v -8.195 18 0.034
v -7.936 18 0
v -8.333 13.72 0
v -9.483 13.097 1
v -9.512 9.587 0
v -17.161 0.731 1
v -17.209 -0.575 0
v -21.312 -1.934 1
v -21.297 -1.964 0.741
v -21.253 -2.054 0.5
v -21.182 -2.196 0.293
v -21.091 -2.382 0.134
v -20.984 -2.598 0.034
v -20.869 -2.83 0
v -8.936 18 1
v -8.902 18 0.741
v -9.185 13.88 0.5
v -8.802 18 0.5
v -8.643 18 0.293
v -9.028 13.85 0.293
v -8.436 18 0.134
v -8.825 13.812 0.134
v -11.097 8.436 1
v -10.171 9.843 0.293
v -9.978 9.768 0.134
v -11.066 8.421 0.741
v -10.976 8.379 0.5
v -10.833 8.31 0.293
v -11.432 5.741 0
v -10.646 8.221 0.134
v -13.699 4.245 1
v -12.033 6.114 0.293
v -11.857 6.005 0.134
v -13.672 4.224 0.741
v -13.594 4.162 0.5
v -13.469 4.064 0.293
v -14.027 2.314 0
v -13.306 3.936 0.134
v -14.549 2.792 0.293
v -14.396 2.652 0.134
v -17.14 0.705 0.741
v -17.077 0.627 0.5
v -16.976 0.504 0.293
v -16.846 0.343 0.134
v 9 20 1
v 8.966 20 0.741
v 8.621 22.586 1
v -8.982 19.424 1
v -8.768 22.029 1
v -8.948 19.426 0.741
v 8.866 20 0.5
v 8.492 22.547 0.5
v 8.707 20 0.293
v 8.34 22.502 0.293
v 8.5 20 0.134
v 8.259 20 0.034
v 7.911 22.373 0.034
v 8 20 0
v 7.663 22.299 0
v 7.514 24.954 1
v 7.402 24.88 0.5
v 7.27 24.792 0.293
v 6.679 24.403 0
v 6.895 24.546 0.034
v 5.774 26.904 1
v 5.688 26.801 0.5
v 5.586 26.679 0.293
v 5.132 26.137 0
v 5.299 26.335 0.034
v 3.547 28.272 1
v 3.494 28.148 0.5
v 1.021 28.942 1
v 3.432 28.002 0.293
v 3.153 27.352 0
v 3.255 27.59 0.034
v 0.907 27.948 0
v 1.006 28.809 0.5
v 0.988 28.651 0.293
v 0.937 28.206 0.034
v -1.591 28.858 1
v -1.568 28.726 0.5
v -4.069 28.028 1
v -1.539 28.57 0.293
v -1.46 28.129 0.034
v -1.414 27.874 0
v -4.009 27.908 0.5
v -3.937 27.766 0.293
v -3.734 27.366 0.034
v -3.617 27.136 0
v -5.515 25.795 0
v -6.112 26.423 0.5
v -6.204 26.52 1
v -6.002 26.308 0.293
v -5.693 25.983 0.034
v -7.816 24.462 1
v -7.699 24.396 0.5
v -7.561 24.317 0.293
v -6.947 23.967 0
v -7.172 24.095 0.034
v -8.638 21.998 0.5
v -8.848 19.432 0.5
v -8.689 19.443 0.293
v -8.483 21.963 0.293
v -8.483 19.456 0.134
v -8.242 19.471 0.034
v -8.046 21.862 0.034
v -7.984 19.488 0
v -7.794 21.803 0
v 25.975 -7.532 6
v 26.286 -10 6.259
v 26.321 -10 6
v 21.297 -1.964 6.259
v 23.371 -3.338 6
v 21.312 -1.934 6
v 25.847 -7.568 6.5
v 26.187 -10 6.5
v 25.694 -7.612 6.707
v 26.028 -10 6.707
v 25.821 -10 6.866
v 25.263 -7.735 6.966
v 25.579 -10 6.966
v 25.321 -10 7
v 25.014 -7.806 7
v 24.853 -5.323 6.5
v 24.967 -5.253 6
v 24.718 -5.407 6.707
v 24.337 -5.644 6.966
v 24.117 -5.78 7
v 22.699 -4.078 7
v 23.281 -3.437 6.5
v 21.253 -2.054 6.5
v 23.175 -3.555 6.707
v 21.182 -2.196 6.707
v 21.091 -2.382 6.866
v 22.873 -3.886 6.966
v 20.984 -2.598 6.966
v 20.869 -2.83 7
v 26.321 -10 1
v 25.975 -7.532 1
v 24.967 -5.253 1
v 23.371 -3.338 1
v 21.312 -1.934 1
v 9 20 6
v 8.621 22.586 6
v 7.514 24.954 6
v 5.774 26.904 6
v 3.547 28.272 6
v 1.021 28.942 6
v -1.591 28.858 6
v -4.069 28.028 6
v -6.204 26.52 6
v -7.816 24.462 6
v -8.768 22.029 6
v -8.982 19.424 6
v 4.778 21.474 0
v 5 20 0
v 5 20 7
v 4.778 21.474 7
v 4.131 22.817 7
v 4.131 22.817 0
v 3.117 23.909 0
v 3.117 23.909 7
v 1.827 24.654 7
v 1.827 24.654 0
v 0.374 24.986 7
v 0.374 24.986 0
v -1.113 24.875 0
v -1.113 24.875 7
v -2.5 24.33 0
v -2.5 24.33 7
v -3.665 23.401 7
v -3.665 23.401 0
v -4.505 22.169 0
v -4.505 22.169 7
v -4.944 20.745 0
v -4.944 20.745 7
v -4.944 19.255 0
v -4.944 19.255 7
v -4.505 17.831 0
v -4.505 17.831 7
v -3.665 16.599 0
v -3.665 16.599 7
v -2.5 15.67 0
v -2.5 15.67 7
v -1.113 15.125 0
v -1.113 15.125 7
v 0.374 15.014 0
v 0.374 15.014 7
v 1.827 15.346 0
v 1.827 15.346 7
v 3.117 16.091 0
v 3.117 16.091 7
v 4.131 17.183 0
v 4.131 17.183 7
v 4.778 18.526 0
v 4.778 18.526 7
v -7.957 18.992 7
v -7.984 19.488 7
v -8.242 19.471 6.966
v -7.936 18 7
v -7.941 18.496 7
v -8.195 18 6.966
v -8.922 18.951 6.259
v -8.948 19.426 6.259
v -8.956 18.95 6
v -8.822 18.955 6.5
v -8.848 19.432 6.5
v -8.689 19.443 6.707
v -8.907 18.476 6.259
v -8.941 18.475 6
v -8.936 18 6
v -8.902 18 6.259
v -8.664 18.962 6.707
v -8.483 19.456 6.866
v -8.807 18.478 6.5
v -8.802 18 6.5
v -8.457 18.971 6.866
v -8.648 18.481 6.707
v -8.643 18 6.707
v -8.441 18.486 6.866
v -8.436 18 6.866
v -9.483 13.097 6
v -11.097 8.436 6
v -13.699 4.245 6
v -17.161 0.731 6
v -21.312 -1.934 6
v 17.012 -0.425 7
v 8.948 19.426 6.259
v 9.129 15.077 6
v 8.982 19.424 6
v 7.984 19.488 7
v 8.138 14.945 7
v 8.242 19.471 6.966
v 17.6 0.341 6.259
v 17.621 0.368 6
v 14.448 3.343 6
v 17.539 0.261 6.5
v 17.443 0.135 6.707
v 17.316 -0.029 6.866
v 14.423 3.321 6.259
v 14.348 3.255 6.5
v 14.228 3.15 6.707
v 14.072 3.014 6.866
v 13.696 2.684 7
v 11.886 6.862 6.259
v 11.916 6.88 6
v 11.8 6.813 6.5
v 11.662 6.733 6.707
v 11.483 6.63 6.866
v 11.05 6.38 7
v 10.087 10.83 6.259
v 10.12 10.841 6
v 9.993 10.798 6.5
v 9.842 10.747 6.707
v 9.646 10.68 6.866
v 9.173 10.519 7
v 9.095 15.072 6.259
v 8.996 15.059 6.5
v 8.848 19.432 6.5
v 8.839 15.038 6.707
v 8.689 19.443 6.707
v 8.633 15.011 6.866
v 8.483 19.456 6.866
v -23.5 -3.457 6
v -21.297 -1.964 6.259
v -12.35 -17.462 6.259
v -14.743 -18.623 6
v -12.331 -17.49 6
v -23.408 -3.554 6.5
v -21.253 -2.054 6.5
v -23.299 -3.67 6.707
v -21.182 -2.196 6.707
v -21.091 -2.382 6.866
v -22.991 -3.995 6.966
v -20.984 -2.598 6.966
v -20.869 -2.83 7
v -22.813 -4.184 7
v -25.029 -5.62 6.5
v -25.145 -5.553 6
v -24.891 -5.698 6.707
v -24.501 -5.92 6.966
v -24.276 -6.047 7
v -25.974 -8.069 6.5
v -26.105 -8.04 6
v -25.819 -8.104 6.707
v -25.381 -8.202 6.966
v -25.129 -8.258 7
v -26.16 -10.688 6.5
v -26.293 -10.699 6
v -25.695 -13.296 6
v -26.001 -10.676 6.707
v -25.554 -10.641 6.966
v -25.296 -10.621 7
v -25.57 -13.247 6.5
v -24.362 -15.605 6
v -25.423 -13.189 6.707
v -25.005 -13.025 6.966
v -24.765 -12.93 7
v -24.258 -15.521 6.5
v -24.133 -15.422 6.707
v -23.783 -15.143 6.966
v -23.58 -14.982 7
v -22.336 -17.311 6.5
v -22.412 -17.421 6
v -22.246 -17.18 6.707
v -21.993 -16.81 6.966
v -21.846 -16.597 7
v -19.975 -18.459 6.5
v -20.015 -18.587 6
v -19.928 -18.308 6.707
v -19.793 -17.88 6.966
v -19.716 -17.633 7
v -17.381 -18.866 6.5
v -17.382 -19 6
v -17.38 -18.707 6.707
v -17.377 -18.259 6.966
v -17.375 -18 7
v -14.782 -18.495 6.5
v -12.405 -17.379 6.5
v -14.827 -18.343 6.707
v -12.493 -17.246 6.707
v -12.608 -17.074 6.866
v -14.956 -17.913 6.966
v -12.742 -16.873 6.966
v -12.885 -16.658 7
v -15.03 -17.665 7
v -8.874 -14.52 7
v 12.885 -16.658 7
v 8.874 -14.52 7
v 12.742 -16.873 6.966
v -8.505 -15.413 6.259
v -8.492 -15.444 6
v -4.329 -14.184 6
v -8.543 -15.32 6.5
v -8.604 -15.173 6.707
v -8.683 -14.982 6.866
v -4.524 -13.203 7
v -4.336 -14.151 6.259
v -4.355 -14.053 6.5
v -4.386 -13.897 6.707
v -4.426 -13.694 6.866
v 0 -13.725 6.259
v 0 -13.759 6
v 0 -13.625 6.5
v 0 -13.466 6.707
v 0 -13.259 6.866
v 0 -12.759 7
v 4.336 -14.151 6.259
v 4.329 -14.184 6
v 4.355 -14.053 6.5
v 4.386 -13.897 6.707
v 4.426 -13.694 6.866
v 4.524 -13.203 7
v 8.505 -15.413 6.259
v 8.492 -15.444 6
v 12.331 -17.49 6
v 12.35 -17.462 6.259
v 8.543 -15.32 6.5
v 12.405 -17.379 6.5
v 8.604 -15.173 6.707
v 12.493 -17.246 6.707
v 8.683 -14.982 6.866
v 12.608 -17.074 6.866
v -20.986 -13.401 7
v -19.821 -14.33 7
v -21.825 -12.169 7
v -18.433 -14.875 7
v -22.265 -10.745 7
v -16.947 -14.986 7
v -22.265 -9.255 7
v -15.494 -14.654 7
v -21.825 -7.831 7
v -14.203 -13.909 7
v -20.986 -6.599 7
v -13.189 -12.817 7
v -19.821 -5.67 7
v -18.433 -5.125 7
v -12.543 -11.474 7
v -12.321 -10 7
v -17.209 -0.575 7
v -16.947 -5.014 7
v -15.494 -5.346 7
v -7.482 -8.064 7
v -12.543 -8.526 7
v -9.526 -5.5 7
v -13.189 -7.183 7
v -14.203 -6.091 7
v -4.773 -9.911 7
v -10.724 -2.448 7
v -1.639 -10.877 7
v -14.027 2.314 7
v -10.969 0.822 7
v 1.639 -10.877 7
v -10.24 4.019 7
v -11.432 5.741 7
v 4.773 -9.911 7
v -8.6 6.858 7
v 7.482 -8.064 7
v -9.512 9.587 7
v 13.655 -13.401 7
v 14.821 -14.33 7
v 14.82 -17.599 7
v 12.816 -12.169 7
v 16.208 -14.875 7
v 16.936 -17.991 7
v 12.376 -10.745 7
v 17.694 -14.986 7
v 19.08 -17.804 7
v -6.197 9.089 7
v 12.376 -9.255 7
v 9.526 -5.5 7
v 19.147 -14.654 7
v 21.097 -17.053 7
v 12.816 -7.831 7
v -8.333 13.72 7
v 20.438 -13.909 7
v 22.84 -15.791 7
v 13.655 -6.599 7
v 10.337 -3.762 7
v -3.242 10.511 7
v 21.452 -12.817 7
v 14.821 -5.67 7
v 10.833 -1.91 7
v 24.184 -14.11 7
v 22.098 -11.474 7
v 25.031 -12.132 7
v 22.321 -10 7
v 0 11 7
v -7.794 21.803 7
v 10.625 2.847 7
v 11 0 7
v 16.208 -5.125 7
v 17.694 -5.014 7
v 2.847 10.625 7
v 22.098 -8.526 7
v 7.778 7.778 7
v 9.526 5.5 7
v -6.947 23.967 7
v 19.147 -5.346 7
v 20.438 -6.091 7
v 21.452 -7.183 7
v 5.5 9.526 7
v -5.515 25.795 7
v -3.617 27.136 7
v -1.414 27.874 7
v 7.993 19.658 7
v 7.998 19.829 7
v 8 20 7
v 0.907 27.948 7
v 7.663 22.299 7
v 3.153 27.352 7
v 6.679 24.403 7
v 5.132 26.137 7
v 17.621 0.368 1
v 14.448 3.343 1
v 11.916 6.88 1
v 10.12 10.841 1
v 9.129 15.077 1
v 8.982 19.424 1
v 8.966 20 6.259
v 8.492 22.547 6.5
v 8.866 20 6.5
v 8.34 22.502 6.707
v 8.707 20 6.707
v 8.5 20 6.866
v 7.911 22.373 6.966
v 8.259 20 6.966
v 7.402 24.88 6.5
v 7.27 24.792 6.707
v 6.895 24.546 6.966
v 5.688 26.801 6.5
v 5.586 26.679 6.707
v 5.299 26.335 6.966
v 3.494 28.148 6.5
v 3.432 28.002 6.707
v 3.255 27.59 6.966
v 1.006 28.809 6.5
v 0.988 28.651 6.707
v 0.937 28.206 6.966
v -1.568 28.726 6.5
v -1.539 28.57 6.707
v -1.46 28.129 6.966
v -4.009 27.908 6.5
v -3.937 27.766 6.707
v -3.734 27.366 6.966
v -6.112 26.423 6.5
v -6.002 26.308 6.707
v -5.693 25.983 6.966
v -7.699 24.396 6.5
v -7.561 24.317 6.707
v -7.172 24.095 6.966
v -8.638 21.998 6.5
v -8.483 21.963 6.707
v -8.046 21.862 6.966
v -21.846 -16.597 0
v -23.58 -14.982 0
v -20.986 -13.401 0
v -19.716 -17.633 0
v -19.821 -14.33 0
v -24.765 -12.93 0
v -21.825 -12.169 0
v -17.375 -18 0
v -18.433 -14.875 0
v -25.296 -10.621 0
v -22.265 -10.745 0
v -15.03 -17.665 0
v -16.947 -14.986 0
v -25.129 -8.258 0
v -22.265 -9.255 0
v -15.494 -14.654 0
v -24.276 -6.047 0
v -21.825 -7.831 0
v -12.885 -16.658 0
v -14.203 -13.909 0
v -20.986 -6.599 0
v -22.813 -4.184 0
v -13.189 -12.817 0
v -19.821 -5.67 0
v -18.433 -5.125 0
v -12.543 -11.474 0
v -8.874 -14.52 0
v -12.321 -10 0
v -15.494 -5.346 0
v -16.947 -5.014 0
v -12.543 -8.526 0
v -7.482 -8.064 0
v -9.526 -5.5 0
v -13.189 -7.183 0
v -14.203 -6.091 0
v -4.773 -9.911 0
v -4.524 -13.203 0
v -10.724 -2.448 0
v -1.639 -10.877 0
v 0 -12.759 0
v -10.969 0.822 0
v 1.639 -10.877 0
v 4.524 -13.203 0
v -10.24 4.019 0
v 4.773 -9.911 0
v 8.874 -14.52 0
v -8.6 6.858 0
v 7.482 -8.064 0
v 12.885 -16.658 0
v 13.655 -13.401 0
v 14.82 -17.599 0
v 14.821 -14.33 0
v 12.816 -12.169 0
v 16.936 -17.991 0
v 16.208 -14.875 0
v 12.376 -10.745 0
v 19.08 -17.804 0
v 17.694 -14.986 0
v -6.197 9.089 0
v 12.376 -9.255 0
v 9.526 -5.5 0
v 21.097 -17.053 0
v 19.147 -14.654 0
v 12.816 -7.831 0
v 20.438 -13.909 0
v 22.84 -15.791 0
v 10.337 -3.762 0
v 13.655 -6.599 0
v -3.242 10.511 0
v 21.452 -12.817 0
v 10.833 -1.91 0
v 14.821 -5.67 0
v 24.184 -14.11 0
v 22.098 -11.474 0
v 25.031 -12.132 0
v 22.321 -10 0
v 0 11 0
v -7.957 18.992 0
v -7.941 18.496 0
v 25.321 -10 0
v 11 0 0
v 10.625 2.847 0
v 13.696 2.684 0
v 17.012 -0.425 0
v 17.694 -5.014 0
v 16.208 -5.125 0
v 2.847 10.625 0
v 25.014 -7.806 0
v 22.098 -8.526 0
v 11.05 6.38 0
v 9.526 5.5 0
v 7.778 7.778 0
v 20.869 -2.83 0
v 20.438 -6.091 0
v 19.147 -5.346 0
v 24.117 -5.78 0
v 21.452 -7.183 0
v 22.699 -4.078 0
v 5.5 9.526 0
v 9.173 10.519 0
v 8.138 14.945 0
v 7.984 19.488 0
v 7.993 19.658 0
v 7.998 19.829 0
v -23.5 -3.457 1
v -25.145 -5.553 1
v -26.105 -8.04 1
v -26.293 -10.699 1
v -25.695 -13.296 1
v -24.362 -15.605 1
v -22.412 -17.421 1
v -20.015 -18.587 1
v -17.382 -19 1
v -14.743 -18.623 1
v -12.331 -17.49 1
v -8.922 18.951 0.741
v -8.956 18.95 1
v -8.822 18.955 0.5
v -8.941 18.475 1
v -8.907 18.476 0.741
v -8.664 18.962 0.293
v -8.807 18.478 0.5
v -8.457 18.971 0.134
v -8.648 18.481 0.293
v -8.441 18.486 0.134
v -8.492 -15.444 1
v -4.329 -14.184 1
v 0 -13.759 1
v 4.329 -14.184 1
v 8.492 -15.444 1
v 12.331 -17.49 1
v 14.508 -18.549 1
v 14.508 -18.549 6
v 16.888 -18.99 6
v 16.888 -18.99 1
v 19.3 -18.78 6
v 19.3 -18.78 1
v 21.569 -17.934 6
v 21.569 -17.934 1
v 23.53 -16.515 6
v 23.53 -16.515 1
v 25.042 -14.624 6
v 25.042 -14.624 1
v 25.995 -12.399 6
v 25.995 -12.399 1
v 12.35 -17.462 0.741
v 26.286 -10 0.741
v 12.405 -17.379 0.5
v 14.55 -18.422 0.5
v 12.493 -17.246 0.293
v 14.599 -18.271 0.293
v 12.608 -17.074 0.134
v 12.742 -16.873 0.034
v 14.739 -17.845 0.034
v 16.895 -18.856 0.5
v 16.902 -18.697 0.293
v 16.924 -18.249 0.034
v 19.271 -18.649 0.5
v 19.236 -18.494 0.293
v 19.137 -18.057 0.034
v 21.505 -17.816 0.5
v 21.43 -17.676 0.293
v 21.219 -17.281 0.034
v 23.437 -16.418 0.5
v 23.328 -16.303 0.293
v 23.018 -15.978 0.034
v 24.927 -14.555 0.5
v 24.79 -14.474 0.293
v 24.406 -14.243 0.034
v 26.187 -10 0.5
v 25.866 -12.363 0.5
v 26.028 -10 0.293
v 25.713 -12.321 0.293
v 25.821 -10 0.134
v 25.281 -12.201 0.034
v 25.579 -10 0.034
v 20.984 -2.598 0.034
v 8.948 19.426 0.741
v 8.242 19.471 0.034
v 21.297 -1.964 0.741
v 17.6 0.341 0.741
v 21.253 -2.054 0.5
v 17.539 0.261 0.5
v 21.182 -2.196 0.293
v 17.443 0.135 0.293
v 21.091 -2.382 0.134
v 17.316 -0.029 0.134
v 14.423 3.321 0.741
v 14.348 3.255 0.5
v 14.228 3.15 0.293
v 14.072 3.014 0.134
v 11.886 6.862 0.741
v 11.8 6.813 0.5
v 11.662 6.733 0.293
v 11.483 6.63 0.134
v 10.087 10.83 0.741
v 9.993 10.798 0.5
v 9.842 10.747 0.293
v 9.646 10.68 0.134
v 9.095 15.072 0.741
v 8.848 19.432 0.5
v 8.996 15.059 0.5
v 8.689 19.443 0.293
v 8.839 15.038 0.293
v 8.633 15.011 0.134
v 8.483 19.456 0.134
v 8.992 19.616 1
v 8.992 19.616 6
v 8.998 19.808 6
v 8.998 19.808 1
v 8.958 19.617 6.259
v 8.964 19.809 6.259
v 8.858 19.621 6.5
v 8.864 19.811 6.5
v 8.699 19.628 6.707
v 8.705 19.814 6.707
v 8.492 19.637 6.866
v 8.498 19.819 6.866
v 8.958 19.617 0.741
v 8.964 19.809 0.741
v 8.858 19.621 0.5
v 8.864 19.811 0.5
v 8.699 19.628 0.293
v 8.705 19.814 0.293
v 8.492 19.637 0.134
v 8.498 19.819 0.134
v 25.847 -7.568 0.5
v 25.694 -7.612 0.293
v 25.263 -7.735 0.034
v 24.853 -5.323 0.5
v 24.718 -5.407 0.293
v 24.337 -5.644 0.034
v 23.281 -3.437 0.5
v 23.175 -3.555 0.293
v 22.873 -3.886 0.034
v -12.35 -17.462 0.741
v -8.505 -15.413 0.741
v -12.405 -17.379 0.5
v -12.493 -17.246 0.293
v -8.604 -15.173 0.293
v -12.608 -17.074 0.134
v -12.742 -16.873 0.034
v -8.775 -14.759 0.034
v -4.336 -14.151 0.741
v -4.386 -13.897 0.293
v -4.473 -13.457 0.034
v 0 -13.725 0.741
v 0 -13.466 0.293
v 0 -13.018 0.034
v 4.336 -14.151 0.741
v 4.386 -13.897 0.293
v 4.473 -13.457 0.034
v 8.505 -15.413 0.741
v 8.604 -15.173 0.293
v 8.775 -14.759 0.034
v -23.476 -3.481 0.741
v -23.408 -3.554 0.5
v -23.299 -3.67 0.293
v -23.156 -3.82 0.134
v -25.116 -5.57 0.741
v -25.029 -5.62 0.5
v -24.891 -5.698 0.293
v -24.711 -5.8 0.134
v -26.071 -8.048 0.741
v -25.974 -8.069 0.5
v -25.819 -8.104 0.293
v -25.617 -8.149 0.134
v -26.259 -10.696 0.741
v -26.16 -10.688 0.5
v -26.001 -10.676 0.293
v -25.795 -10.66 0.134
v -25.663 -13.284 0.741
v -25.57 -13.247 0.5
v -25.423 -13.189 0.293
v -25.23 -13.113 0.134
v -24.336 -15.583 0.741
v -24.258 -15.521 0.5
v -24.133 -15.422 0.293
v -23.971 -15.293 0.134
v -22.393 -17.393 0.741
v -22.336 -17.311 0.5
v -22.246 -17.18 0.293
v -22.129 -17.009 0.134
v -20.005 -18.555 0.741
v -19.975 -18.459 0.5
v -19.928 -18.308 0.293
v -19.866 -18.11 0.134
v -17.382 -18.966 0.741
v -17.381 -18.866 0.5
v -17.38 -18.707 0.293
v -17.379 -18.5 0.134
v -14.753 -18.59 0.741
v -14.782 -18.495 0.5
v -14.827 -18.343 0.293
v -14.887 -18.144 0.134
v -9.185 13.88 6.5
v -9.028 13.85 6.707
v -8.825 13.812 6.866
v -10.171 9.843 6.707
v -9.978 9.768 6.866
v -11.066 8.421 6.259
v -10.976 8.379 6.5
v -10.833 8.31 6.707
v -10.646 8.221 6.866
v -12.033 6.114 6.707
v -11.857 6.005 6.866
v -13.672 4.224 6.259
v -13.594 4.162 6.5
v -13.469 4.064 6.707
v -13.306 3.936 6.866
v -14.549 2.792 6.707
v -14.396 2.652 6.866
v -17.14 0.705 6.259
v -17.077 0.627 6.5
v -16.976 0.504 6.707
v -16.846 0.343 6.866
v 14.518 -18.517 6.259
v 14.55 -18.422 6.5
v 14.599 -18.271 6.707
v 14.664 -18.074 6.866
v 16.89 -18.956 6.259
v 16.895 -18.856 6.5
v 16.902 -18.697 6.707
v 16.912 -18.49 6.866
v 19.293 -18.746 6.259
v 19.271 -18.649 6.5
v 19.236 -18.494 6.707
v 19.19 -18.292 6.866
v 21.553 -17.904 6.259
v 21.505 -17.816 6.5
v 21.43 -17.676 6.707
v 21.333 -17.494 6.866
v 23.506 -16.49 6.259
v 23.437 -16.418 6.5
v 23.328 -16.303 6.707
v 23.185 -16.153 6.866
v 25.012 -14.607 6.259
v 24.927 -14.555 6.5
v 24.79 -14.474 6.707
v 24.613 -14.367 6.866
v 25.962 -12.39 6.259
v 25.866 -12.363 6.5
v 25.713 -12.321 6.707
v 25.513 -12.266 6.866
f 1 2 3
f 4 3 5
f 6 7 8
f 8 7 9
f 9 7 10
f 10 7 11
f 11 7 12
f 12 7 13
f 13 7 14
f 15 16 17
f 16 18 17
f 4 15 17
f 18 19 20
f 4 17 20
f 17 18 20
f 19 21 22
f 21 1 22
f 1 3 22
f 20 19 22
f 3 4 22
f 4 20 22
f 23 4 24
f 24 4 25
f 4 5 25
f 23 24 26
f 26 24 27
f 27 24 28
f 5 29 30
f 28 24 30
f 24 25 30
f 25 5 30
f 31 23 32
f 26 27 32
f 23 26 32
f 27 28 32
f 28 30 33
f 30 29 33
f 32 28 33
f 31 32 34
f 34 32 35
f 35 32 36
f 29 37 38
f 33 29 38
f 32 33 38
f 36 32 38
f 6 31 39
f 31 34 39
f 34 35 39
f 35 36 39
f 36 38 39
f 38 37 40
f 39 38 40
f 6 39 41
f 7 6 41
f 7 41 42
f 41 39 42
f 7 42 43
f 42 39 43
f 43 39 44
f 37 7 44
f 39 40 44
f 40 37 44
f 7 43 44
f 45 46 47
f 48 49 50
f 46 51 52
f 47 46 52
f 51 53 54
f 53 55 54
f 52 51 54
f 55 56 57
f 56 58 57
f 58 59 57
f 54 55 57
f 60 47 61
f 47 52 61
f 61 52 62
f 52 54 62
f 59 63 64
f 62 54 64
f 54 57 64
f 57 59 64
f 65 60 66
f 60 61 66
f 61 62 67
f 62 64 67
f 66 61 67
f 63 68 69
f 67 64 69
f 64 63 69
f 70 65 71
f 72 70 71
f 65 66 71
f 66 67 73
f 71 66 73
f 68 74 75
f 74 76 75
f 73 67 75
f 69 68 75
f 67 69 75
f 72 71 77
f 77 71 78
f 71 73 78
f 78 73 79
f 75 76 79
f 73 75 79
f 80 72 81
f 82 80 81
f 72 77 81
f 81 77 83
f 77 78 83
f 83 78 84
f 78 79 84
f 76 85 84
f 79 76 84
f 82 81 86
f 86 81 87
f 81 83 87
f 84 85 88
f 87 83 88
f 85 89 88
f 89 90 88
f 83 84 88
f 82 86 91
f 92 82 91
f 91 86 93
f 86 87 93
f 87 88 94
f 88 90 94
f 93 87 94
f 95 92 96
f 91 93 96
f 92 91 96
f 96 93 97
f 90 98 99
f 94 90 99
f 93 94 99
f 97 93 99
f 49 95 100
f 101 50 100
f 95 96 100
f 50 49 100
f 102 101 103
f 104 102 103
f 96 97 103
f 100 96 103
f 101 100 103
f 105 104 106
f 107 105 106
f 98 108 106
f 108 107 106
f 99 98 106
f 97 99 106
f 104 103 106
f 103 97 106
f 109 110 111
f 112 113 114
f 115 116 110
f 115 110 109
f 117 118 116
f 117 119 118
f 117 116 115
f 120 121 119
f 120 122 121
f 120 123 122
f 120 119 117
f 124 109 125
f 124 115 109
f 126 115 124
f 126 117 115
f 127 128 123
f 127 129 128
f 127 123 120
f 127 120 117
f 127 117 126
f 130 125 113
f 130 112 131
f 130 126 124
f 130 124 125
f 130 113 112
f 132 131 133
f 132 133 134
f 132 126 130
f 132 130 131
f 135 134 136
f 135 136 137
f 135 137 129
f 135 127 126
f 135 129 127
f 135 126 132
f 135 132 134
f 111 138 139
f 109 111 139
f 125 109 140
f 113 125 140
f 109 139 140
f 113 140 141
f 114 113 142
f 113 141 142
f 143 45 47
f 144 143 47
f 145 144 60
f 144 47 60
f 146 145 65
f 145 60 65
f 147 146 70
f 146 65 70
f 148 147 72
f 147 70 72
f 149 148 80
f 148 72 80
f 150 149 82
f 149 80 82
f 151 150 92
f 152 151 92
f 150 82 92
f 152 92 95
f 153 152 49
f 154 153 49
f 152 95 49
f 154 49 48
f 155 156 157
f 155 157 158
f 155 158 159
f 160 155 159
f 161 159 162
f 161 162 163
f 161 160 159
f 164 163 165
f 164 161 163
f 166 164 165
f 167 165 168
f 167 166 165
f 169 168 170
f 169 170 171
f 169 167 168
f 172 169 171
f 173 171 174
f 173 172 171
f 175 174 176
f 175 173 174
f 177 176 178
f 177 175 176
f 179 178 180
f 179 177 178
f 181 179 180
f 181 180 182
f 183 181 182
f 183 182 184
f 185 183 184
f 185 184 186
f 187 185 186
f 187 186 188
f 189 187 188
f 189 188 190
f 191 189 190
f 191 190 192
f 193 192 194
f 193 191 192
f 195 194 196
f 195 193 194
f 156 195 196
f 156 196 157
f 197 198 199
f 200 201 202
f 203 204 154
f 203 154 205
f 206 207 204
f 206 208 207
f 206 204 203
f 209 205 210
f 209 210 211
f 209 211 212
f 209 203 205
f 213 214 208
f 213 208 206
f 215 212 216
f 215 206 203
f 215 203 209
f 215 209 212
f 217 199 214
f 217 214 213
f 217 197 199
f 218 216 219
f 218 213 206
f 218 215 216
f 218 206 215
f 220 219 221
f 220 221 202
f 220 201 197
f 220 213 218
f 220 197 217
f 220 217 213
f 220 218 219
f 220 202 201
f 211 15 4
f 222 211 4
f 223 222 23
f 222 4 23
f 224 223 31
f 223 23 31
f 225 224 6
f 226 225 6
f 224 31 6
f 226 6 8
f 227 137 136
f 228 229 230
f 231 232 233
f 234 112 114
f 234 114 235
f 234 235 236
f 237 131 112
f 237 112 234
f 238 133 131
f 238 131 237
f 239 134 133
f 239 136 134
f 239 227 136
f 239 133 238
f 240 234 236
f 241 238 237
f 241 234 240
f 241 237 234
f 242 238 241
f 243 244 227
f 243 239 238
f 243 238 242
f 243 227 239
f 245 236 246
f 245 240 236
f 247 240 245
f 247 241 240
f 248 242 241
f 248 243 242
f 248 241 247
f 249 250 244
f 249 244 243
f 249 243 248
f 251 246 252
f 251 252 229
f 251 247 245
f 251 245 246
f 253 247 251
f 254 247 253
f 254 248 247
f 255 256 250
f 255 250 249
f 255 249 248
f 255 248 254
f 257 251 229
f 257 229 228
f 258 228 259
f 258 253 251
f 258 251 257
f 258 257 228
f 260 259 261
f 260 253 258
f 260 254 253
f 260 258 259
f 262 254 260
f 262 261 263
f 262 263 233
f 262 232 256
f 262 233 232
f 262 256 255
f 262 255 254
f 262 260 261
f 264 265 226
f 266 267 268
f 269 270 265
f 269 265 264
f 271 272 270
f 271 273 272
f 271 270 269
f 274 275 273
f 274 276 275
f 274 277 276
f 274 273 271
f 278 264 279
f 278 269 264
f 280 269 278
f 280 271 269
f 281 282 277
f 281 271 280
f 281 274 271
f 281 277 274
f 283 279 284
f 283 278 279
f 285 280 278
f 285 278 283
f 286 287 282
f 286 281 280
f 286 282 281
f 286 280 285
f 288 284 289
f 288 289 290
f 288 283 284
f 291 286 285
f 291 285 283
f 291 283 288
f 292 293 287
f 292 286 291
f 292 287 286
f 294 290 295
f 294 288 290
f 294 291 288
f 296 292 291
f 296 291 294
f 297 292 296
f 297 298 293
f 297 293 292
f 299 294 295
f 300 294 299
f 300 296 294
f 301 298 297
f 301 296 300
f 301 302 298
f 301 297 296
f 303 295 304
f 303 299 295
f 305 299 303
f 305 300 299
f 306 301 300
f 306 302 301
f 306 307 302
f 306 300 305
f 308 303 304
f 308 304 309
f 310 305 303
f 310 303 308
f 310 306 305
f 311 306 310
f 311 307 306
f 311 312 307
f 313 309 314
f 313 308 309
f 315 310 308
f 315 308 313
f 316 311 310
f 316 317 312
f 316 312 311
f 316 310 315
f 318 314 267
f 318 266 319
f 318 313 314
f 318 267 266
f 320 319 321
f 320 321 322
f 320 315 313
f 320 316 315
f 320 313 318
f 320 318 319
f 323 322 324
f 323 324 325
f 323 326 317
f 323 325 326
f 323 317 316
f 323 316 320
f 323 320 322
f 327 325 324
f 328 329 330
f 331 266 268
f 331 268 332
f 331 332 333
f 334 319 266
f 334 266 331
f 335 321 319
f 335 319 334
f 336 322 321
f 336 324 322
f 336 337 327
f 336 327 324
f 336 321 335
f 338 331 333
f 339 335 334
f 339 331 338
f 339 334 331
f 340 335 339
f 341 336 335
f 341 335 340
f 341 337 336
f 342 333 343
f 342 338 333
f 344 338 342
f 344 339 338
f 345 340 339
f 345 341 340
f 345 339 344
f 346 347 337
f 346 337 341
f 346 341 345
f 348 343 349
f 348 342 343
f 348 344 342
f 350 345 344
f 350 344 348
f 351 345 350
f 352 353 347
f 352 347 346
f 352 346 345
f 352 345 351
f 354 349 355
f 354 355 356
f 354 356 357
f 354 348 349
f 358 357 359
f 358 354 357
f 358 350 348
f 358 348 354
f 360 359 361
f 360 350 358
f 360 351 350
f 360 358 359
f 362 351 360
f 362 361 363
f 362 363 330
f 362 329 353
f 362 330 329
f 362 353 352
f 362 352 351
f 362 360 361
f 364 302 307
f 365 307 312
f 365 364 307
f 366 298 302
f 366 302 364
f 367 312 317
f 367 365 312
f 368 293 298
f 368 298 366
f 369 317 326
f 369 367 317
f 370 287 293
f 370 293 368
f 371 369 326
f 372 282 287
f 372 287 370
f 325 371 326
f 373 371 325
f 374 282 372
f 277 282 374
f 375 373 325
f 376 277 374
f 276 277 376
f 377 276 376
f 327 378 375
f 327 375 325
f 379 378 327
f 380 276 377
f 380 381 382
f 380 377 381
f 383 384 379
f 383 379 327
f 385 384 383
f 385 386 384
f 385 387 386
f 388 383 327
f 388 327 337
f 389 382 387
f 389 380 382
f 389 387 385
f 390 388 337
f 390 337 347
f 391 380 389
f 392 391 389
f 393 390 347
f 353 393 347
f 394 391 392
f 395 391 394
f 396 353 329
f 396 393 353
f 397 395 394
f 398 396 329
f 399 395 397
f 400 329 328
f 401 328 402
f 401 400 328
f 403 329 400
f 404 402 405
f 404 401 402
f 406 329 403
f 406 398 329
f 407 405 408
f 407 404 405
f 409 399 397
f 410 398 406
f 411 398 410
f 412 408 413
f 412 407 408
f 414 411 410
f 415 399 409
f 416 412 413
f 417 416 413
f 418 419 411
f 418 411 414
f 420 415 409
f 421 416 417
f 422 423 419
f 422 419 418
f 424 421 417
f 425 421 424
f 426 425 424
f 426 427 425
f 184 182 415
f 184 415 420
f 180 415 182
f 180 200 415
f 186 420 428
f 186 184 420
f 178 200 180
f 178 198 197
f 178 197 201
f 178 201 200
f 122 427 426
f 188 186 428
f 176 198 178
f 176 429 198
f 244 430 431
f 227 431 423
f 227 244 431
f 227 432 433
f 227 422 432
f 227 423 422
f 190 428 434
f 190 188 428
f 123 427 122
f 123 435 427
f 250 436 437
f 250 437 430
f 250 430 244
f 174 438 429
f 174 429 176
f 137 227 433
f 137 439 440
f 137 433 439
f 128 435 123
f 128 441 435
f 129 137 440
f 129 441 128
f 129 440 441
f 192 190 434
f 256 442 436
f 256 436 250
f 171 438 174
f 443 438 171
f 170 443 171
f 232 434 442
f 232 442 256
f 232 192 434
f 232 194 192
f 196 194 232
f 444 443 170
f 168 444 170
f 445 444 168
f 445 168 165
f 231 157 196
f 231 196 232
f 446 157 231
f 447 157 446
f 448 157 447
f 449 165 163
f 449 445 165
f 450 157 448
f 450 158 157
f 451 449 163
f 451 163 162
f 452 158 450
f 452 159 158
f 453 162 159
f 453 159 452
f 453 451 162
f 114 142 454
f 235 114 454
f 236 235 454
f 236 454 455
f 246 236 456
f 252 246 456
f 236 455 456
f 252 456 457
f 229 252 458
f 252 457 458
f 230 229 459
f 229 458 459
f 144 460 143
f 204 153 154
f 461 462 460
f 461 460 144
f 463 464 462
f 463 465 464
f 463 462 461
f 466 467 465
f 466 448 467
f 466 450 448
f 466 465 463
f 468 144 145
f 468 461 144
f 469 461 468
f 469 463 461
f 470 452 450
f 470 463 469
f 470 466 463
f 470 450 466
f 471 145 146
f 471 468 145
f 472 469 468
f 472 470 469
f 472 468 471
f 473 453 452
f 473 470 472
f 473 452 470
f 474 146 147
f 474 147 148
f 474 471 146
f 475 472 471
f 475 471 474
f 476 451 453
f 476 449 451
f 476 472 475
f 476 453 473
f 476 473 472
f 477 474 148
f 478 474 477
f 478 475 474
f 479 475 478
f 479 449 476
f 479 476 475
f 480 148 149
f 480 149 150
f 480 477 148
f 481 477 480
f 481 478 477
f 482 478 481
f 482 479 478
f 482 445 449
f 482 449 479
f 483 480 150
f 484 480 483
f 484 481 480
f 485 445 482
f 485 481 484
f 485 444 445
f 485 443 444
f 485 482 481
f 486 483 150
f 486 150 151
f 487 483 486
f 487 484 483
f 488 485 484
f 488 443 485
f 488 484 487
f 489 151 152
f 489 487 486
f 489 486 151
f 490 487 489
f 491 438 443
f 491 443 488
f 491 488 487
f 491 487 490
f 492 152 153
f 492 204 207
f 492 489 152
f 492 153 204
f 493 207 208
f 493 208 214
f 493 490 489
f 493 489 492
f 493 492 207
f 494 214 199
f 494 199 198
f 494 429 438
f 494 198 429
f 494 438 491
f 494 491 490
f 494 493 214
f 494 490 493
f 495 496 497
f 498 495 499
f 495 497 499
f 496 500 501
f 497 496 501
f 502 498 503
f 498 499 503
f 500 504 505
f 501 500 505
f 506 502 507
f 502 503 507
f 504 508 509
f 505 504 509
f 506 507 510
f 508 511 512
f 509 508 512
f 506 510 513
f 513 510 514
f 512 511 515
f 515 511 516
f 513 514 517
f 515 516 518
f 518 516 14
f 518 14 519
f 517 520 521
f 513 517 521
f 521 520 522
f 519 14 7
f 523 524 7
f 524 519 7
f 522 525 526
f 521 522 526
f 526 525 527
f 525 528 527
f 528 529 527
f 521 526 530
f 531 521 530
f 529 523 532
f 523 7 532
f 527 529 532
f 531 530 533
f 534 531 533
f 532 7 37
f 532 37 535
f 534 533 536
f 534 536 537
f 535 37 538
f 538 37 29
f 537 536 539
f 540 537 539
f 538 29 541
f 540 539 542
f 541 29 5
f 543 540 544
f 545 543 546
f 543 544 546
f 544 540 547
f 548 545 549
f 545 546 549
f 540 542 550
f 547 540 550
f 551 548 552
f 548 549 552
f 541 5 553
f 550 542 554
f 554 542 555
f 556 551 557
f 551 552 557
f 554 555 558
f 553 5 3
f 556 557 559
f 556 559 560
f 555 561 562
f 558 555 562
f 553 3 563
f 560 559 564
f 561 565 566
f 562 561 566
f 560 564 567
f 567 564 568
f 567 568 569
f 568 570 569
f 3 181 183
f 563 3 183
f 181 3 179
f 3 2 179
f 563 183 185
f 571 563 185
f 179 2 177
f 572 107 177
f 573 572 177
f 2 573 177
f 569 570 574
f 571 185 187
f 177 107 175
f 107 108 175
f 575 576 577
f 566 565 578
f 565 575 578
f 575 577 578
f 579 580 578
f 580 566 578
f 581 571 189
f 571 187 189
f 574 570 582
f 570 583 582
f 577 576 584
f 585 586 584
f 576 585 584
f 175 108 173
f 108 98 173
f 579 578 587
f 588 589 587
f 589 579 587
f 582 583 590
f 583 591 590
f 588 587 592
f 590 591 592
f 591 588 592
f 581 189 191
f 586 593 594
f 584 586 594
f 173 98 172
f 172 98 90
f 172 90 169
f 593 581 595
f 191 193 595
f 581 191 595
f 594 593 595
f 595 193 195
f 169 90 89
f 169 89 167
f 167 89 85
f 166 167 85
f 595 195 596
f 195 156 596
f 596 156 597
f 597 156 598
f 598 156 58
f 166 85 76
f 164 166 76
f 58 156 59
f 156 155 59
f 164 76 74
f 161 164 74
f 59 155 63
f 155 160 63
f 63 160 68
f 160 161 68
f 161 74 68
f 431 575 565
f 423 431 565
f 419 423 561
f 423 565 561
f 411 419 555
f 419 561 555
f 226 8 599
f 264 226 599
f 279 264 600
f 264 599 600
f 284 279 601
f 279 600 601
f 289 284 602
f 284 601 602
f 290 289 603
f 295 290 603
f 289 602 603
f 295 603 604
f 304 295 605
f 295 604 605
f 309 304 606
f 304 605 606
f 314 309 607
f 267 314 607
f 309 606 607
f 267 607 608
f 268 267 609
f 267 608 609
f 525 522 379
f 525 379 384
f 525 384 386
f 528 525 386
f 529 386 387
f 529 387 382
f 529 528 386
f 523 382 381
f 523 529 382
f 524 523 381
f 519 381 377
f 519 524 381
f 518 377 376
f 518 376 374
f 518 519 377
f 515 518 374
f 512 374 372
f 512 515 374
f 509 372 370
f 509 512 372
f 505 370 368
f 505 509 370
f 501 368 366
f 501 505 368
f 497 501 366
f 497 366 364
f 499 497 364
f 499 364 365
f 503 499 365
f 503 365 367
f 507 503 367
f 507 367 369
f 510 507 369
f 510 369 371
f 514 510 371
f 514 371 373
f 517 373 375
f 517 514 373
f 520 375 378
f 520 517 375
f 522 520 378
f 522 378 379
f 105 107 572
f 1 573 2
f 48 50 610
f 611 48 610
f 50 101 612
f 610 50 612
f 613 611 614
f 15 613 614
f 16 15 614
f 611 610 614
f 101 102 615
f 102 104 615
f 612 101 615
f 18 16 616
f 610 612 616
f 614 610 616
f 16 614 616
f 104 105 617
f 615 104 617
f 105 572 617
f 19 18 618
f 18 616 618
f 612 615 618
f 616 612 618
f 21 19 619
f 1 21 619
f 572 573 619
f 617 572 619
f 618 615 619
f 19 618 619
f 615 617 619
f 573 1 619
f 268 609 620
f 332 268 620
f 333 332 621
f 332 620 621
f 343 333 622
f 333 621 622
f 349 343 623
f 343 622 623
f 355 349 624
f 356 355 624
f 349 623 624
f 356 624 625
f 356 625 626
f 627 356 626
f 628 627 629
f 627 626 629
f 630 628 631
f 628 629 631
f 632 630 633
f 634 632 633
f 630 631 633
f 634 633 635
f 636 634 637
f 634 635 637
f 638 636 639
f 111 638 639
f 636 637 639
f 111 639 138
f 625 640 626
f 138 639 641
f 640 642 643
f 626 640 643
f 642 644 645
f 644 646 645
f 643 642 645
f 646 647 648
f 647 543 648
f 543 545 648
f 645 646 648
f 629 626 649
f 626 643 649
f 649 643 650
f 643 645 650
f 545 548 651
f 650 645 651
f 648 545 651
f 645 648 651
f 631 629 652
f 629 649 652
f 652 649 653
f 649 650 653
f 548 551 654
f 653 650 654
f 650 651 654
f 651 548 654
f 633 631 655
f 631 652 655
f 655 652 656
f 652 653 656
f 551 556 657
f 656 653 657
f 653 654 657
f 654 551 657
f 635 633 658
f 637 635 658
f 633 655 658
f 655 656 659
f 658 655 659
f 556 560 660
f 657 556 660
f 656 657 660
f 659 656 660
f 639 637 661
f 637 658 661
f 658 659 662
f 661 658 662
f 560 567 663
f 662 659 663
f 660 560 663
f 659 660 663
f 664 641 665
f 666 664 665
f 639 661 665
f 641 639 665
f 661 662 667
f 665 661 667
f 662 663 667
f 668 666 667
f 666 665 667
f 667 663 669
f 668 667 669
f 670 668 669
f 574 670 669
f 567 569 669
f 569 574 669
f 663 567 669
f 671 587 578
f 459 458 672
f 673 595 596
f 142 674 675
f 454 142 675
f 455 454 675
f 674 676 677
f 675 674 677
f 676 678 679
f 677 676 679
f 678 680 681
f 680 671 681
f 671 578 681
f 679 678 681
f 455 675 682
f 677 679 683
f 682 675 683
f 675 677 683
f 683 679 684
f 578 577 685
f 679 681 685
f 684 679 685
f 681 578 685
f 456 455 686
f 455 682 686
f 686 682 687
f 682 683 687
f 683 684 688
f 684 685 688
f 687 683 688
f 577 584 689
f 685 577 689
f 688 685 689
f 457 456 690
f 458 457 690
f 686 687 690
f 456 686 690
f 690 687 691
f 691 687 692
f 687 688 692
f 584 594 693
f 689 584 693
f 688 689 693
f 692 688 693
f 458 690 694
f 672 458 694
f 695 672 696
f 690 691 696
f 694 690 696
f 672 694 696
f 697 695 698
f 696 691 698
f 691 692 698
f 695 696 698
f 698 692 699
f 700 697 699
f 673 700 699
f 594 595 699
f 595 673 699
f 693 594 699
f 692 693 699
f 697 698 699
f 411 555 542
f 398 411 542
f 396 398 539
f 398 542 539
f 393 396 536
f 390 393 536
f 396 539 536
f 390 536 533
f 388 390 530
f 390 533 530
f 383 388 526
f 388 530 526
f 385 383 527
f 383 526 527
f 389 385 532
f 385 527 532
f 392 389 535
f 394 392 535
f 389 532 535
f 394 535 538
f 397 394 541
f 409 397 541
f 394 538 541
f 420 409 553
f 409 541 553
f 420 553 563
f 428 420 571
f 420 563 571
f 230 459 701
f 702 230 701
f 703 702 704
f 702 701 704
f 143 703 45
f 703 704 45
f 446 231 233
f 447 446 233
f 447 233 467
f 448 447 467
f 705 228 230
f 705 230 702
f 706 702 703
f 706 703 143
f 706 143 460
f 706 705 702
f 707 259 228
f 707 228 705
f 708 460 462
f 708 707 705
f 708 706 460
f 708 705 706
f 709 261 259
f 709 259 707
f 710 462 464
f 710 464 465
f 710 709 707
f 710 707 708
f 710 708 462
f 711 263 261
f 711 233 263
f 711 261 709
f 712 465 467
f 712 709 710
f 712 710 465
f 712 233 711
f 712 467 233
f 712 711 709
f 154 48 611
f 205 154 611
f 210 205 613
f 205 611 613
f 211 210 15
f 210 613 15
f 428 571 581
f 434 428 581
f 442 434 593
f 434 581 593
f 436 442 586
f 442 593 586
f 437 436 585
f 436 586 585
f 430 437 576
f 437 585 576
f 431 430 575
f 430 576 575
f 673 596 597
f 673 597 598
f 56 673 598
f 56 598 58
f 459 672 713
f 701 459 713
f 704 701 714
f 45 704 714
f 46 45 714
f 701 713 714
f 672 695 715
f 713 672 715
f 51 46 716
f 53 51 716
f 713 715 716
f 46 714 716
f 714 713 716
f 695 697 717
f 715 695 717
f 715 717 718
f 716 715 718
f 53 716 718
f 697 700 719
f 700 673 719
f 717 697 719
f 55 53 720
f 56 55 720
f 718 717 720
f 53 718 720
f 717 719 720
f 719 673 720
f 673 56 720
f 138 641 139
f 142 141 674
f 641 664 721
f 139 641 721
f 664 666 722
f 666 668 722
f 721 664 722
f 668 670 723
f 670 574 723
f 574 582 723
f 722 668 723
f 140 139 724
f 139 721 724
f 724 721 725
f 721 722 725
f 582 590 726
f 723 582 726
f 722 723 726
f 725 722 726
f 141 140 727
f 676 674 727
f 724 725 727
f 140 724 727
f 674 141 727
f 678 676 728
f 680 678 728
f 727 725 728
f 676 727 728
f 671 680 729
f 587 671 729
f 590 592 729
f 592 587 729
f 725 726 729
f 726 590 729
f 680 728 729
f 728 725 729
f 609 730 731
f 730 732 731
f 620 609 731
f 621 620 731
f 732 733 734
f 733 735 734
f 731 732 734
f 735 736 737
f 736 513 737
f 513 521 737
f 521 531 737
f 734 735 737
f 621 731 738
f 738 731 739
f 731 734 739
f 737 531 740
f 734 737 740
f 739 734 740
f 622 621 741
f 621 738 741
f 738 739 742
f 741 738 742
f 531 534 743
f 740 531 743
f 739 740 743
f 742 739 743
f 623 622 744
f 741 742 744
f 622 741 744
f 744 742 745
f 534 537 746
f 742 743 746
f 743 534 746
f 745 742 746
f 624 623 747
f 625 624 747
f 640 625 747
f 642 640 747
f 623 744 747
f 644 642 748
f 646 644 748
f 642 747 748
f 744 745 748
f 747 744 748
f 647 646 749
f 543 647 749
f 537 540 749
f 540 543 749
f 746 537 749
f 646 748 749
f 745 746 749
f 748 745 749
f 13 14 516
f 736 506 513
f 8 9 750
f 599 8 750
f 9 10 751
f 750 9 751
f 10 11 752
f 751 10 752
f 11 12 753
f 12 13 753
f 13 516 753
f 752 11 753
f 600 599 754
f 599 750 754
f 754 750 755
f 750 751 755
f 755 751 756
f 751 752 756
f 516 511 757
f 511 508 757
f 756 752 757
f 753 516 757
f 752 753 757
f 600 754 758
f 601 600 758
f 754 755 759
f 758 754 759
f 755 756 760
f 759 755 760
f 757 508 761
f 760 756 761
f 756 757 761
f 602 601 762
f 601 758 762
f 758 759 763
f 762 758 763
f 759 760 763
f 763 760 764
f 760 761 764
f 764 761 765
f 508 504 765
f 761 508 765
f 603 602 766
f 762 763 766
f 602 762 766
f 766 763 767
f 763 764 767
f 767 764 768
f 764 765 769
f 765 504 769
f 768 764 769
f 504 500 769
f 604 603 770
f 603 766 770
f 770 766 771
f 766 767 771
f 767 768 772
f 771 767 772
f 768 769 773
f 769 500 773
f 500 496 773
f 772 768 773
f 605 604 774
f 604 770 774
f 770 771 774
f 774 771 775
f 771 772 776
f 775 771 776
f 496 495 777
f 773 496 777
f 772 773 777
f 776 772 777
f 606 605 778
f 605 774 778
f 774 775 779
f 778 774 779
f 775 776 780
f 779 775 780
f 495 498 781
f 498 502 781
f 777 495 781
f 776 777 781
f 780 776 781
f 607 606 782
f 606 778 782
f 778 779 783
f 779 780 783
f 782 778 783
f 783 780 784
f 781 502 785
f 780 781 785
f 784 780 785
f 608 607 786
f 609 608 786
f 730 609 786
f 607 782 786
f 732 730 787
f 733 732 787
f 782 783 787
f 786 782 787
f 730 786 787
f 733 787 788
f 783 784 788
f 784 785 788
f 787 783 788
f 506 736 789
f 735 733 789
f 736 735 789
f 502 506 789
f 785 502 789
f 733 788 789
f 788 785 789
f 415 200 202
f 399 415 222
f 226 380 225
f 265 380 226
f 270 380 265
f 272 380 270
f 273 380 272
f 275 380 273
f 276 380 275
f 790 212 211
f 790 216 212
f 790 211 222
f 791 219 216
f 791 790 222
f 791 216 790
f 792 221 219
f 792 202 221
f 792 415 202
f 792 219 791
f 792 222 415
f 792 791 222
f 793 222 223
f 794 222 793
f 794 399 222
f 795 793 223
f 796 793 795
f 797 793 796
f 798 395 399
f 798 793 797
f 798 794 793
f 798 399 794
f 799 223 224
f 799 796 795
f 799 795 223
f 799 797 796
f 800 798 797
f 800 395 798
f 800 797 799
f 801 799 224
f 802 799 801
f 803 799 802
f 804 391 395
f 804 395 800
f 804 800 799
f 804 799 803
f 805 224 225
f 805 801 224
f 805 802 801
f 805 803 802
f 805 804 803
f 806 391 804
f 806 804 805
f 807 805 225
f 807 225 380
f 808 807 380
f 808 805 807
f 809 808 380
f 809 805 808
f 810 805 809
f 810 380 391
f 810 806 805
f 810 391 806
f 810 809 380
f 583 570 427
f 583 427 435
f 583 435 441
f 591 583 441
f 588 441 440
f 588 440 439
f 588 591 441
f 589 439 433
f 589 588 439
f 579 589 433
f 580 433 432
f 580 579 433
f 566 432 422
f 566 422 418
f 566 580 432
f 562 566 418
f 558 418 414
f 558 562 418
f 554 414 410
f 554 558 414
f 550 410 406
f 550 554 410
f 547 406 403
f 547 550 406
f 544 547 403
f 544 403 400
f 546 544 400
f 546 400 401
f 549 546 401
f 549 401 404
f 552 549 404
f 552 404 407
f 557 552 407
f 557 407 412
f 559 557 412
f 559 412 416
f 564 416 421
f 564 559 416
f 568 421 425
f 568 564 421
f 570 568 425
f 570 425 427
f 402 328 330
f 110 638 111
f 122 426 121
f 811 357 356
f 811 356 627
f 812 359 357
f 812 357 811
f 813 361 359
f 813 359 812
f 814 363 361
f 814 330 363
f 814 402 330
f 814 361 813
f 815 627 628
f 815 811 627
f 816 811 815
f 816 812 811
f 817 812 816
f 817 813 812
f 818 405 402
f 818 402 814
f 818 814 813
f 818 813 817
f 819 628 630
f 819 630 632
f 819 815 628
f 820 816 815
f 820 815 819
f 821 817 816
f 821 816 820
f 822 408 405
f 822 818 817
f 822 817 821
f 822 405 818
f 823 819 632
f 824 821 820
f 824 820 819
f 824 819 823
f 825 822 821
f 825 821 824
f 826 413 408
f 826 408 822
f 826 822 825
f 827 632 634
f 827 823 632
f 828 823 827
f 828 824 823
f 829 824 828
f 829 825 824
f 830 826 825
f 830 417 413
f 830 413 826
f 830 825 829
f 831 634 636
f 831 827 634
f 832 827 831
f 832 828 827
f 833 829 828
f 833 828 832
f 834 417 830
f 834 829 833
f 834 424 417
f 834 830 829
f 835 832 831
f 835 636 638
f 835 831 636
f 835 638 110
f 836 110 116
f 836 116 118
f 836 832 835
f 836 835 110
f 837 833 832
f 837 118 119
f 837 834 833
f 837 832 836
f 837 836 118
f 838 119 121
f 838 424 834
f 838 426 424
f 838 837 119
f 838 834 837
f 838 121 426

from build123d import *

# Parameters (mm, degrees)
F0_R     = 5
F1_DEPTH = 7
F2_R     = 1


with BuildPart() as f1:
    # F0 (on Top) → F1 (new body)
    with BuildSketch(Plane.XY):
        with BuildLine():
            ThreePointArc((21.3123029217, -1.9336765557), (14.7139218512, -1.3857264813), (9.5262793734, -5.5000001181))
            ThreePointArc((9.5262793734, -5.5000001181), (8.5570353366, -12.0497671944), (12.3307648053, -17.4901576816))
            ThreePointArc((12.3307648053, -17.4901576816), (21.5685847326, -17.9343458909), (26.3205080757, -10))
            ThreePointArc((26.3205080757, -10), (24.9666232205, -5.2526930589), (21.3123029217, -1.9336765557))
        make_face()
        with Locations((17.3205080757, -10)):
            Circle(F0_R, mode=Mode.SUBTRACT)
        with BuildLine():
            ThreePointArc((-8.3205080757, -10), (-8.6271756178, -7.6706286735), (-9.5262793594, -5.5000001424))
            ThreePointArc((-9.5262793594, -5.5000001424), (-14.7139219474, -1.3857264522), (-21.312303127, -1.9336766573))
            ThreePointArc((-21.312303127, -1.9336766573), (-25.1147367037, -14.5000000105), (-12.3307646513, -17.490157579))
            ThreePointArc((-12.3307646513, -17.490157579), (-9.3861621411, -14.2480765754), (-8.3205080757, -10))
        make_face()
        with Locations((-17.3205080757, -10)):
            Circle(F0_R, mode=Mode.SUBTRACT)
        with BuildLine():
            ThreePointArc((-9.5262793594, -5.5000001424), (-9.5262794827, 5.4999999288), (0, 11))
            ThreePointArc((0, 11), (-6.1568865898, 13.4354933529), (-8.9815384321, 19.4238338845))
            ThreePointArc((-8.9815384321, 19.4238338845), (-8.9473244085, 18.7122823092), (-8.9359158326, 18))
            ThreePointArc((-8.9359158326, 18), (-12.2816660211, 6.2683502062), (-21.312303127, -1.9336766573))
            ThreePointArc((-21.312303127, -1.9336766573), (-14.7139219474, -1.3857264522), (-9.5262793594, -5.5000001424))
        make_face()
        with BuildLine():
            ThreePointArc((12.3307648053, -17.4901576816), (8.5570353366, -12.0497671944), (9.5262793734, -5.5000001181))
            ThreePointArc((9.5262793734, -5.5000001181), (1.4e-08, -11), (-9.5262793594, -5.5000001424))
            ThreePointArc((-9.5262793594, -5.5000001424), (-8.6271756178, -7.6706286735), (-8.3205080757, -10))
            ThreePointArc((-8.3205080757, -10), (-9.3861621411, -14.2480765754), (-12.3307646513, -17.490157579))
            ThreePointArc((-12.3307646513, -17.490157579), (9.25e-08, -13.7590012964), (12.3307648053, -17.4901576816))
        make_face()
        with BuildLine():
            ThreePointArc((0, 11), (7.7781745931, 7.7781745931), (11, 0))
            ThreePointArc((11, 0), (10.6251840715, -2.847009562), (9.5262793734, -5.5000001181))
            ThreePointArc((9.5262793734, -5.5000001181), (14.7139218512, -1.3857264813), (21.3123029217, -1.9336765557))
            ThreePointArc((21.3123029217, -1.9336765557), (11.9156446994, 6.8795005684), (8.9815384291, 19.4238338374))
            ThreePointArc((8.9815384291, 19.4238338374), (6.1568865726, 13.4354933368), (0, 11))
        make_face()
        with BuildLine():
            ThreePointArc((-8.9815384321, 19.4238338845), (-6.1568865898, 13.4354933529), (0, 11))
            ThreePointArc((0, 11), (6.1568865726, 13.4354933368), (8.9815384291, 19.4238338374))
            ThreePointArc((8.9815384291, 19.4238338374), (8.9953834232, 19.7117690698), (9, 20))
            ThreePointArc((9, 20), (-0.2882309066, 28.995383424), (-8.9815384321, 19.4238338845))
        make_face()
        with Locations((0, 20)):
            Circle(F0_R, mode=Mode.SUBTRACT)
    extrude(amount=F1_DEPTH)

    # F2
    f2_edges = [f1.edges().sort_by_distance(p)[0] for p in [
        (-25.114737, -14.5, 7),
        (0, -13.759001, 7),
        (25.114737, -14.5, 7),
        (11.915645, 6.879501, 7),
        (-11.915645, 6.8795, 7),
        (0, 29, 7),
        (25.114737, -14.5, 0),
        (0, -13.759001, 0),
        (-25.114737, -14.5, 0),
        (-11.915645, 6.8795, 0),
        (0, 29, 0),
        (11.915645, 6.879501, 0),
    ]]
    fillet(f2_edges, radius=F2_R)


solid = f1.part
